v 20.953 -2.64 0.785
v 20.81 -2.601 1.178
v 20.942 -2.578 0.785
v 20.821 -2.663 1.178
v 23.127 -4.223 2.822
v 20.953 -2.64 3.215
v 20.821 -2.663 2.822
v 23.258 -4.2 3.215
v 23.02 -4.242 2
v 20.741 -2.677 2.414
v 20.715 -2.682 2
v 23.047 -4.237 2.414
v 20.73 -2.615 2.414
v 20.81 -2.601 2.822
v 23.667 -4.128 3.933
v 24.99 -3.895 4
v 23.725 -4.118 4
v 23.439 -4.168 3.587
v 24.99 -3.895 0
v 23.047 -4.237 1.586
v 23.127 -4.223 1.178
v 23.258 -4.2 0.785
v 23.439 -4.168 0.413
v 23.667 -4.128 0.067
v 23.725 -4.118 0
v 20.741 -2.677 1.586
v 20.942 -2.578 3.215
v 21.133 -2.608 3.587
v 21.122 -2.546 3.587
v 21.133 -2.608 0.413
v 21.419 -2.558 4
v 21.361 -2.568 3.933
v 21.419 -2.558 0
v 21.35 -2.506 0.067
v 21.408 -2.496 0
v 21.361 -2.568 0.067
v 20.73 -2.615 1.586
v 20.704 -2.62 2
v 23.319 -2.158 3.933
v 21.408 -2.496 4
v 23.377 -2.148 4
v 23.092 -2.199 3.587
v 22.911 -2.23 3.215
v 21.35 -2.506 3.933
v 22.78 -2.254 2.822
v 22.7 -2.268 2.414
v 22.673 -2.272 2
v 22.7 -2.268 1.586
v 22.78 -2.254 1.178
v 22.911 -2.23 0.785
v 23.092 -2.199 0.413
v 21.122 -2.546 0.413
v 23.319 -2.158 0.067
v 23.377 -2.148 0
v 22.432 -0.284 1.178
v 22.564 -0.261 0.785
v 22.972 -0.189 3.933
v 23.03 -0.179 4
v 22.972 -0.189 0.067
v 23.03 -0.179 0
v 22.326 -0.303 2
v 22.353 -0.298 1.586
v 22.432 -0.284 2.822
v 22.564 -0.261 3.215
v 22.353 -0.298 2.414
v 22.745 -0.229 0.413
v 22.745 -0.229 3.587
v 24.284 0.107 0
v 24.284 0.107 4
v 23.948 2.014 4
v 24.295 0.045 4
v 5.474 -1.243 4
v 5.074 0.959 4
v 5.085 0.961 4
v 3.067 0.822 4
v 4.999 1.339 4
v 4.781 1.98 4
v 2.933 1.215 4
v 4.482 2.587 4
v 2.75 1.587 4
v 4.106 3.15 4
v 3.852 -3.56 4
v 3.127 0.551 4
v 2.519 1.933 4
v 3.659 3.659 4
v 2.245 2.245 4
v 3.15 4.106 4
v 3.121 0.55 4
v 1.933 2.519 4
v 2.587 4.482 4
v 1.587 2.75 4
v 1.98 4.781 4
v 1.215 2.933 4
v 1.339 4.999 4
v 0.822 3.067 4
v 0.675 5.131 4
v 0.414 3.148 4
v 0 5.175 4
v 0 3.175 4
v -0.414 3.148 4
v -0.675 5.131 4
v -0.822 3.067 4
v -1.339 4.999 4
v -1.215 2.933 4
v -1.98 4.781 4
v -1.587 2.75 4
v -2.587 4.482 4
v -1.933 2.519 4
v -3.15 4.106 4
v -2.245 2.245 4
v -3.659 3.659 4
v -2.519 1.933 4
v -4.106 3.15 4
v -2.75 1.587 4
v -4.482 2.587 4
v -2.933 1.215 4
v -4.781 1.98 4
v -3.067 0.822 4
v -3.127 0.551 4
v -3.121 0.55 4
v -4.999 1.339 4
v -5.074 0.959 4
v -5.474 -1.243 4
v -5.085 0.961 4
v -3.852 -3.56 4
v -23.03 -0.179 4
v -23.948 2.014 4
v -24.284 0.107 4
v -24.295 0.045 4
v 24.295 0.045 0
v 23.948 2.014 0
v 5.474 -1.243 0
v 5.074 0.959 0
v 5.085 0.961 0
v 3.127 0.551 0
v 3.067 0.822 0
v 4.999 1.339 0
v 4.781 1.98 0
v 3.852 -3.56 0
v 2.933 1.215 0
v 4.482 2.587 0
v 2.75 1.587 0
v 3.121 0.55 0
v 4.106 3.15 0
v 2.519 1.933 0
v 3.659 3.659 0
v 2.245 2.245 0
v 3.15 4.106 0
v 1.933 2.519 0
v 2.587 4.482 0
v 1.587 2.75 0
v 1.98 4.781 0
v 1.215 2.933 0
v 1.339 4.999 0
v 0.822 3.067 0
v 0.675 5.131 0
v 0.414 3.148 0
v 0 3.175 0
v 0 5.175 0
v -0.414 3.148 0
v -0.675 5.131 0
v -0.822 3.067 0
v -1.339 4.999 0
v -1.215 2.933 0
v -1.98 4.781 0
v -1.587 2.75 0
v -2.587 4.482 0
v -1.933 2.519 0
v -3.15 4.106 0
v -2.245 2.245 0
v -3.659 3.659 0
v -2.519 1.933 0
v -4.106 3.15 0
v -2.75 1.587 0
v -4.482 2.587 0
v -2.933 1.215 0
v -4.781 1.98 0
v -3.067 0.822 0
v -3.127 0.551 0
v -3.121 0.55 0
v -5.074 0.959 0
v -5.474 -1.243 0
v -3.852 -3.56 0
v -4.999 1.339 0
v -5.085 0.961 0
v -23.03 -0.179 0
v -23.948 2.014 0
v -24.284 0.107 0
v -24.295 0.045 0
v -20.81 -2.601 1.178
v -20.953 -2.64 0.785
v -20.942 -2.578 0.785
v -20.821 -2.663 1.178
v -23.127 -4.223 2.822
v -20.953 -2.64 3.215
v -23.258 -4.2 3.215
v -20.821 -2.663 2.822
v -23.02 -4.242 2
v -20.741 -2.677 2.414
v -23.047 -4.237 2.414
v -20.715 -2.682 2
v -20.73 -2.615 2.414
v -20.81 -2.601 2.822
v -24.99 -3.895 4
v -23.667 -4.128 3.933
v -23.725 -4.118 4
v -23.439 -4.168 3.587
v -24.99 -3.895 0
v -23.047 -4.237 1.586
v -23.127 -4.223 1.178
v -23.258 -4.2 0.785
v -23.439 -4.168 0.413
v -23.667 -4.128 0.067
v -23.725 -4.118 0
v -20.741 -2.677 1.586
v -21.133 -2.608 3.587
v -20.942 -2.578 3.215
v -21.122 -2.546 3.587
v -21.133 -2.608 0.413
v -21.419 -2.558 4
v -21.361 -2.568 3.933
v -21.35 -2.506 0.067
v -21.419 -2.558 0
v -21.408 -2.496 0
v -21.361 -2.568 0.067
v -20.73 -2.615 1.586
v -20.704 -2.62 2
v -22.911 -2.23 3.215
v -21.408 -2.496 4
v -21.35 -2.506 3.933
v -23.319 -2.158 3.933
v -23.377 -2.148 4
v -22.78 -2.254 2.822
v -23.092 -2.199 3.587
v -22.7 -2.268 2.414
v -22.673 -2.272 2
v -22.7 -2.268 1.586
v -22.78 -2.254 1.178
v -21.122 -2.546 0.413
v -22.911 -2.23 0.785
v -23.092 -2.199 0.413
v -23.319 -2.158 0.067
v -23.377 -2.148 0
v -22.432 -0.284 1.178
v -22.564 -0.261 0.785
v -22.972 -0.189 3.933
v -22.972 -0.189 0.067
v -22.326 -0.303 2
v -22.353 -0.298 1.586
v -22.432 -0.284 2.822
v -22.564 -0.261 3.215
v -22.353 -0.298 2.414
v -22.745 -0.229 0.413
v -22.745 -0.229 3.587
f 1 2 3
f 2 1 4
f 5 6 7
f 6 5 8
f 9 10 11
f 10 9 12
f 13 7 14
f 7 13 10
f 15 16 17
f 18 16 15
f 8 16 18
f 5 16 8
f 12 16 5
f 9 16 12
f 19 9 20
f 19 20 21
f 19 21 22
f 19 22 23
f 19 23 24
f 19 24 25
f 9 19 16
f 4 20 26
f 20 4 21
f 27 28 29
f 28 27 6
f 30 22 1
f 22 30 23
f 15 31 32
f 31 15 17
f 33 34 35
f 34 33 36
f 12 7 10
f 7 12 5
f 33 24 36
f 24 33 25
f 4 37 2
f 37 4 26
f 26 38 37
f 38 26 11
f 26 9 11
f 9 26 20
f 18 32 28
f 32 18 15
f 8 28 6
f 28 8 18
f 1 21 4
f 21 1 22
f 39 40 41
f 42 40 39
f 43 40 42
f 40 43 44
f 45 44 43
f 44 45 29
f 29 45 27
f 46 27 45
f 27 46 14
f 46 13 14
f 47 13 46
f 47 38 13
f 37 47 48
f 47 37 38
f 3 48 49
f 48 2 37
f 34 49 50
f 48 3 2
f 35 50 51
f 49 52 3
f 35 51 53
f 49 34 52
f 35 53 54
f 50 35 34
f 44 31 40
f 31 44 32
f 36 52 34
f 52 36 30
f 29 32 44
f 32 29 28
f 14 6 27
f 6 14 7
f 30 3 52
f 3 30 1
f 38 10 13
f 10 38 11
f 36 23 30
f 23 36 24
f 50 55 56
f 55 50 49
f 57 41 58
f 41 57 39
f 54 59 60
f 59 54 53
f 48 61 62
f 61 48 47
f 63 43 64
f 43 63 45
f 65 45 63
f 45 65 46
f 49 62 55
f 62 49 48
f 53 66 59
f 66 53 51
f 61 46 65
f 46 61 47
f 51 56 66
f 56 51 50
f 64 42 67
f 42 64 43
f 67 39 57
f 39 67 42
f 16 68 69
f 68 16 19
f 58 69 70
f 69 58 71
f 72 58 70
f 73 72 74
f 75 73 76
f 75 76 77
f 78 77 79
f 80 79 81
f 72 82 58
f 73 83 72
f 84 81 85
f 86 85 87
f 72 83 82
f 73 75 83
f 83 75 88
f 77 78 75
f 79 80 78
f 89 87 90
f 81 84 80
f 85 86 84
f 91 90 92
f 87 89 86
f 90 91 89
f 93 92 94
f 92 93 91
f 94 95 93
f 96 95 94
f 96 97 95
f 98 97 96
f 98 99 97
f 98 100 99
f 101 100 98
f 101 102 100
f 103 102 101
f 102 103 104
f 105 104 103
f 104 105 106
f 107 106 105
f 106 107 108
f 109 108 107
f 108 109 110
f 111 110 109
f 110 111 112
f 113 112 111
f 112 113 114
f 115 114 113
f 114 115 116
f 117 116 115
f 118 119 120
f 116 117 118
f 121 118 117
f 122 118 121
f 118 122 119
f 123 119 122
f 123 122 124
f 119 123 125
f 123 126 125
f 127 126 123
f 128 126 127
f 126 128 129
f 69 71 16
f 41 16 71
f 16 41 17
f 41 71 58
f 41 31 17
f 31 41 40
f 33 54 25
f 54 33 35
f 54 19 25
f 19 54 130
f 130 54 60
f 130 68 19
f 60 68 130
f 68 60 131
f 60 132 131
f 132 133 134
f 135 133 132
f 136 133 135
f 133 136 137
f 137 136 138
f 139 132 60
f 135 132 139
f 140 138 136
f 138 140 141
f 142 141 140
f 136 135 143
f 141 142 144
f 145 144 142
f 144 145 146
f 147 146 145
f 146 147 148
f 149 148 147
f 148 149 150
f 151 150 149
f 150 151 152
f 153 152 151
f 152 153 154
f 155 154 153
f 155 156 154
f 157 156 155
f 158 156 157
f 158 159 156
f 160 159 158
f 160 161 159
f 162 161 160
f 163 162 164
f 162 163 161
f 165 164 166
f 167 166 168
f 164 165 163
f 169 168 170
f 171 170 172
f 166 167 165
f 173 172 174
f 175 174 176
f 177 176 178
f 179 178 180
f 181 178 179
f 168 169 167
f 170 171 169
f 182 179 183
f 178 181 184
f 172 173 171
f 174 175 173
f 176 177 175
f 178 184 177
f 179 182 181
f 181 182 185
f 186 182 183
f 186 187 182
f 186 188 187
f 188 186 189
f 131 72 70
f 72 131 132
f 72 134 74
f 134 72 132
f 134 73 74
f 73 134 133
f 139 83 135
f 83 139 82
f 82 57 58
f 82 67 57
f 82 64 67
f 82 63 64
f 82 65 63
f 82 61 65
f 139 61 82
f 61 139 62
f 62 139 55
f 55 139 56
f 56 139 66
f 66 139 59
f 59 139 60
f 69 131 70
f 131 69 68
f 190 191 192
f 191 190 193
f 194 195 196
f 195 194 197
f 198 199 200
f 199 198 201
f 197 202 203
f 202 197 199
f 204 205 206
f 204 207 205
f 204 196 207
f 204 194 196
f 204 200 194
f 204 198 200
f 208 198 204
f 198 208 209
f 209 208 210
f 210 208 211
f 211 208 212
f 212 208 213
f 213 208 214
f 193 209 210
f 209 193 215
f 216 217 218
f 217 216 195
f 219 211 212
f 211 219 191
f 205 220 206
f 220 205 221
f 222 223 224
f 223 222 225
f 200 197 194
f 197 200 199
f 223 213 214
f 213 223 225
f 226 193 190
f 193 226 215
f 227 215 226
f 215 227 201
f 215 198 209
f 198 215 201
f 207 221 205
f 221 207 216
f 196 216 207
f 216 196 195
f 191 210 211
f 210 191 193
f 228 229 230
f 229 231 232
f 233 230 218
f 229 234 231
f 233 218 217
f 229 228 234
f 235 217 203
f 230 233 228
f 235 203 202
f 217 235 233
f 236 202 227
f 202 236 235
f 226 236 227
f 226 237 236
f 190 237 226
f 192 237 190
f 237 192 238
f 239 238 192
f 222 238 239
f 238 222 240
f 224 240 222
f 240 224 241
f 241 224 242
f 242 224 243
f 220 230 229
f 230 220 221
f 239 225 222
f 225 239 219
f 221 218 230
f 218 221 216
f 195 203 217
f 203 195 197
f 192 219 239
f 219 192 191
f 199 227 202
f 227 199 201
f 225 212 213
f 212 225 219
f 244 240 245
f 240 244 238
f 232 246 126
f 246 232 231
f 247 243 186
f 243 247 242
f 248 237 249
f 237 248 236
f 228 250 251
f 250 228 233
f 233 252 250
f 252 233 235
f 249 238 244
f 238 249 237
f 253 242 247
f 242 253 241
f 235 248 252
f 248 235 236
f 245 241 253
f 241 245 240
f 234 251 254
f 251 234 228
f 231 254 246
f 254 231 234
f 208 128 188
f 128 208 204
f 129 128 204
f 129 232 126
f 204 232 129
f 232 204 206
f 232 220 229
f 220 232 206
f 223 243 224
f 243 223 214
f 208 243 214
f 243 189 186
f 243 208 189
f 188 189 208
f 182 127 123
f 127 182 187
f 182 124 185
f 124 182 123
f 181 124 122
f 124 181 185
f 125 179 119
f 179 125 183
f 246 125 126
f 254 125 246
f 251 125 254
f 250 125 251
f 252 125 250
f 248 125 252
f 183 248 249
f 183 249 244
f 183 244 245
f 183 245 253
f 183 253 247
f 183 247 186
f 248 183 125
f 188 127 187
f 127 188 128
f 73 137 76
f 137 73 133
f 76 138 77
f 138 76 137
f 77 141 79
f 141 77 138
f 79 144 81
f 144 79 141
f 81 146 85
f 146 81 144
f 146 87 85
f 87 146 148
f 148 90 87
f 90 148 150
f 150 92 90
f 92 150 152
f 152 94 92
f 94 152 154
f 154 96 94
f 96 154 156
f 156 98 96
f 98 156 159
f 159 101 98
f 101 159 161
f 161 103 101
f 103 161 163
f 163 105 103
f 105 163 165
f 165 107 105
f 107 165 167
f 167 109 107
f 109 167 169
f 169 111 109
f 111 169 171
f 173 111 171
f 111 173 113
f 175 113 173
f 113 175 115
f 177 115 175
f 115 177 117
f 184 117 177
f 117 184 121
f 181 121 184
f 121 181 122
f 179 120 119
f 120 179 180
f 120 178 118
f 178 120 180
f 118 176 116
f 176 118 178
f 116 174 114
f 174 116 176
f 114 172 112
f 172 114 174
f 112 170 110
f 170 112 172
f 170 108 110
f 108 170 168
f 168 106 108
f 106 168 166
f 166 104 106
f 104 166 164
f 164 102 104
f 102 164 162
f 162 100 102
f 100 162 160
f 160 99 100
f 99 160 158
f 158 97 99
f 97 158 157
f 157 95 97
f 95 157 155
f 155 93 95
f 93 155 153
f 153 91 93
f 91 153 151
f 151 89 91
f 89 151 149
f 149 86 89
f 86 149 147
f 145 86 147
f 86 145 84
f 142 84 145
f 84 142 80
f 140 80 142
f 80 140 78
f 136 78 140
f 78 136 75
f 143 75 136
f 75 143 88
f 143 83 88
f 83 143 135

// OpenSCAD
//
// Customizer UI
//

// (mm) distance between nearby pegboard's holes
hole_spacing = 24.4;
L = hole_spacing;

// (mm) diameter of a pegboard's hole
hole_diameter = 6.35;
D = hole_diameter;

// (mm) diameter of a pegboard's hook
hook_diameter = 6.35;
d = hook_diameter;

// (mm) width of the clip; must be smaller than the diameter of a pegboard's hole
clip_width = 4;
W = clip_width;

// 0-90; pick smaller values for more rigid plastic
spring_angle = 10;
a = spring_angle;

// (mm) extra space to allow for the spring action
spring_space = 1;
x = spring_space;

// (mm) thickness of the clip's round part
bend_thickness = 2;
w = bend_thickness;

// (mm) thickness of the clip's long parts
leg_thickness = 2;
v = leg_thickness;

// (mm) thickness of the clip's hook
hook_thickness = 2;
u = hook_thickness;

// (mm) size of the clip's hook; must be larger than the pegboard's thickness
clip_hook_size = 2;
h = clip_hook_size;

// (mm) size of the notch on the clip's hook
clip_hook_notch = 2;
n = clip_hook_notch;

// number of round part's fragments; more is smoother, but slower
bend_fragments = 48; // [24, 32, 48, 72, 96]
$fn = bend_fragments;

//
// Convenience variables
//

m = D/100;
R = D/2;
r = d/2;
s = r + w;
y = (D - sqrt(D*D - W*W))/2;
l = L - r - R + y;

//
// Scene
//

union()
{
    ClipLeg();

    ClipBend();

    mirror([1, 0, 0])
    ClipLeg();
}

//
// Parts of the clip
//

module ClipLeg()
{
    rotate([0, 0, a])
    union()
    {
        // Straight part
        linear_extrude(height = W)
        translate([r, -(r + x)])
        polygon([
            [0, 0],
            [l + u, 0],
            [l + u, v],
            [w, v],
            [w, r + x + m],
            [0, r + x + m]
        ]);

        // Hook
        translate([r + l + u, -(r + x), 0])
        translate([R - (n + u), -h, W/2])
        rotate([90, 0, 0])
        difference()
        {
            union()
            {
                hull()
                {
                    union()
                    {
                        cylinder(h = m, d = D);

                        translate([R + u - m, 0, u/2])
                        cube([m, D, u], center = true);
                    }

                    translate([u, 0, u - m])
                    cylinder(h = m, d = D);
                }

                translate([n, 0, -(h + m)])
                cylinder(h = m + h + m, d = D);
            }

            translate([n + u + R, 0, 0])
            cube(2*D, center = true);

            translate([0, D + W/2, 0])
            cube(2*D, center = true);

            translate([0, -(D + W/2), 0])
            cube(2*D, center = true);
        }
    }
}

module ClipBend()
{
    mask = [
        [s, 0],
        [s, -s],
        [-s, -s],
        [-s, 0]
    ];

    linear_extrude(height = W)
    difference()
    {
        circle(r = s);

        circle(r = r);

        rotate([0, 0, a])
        polygon(mask);

        rotate([0, 0, -a])
        polygon(mask);
    }
}
